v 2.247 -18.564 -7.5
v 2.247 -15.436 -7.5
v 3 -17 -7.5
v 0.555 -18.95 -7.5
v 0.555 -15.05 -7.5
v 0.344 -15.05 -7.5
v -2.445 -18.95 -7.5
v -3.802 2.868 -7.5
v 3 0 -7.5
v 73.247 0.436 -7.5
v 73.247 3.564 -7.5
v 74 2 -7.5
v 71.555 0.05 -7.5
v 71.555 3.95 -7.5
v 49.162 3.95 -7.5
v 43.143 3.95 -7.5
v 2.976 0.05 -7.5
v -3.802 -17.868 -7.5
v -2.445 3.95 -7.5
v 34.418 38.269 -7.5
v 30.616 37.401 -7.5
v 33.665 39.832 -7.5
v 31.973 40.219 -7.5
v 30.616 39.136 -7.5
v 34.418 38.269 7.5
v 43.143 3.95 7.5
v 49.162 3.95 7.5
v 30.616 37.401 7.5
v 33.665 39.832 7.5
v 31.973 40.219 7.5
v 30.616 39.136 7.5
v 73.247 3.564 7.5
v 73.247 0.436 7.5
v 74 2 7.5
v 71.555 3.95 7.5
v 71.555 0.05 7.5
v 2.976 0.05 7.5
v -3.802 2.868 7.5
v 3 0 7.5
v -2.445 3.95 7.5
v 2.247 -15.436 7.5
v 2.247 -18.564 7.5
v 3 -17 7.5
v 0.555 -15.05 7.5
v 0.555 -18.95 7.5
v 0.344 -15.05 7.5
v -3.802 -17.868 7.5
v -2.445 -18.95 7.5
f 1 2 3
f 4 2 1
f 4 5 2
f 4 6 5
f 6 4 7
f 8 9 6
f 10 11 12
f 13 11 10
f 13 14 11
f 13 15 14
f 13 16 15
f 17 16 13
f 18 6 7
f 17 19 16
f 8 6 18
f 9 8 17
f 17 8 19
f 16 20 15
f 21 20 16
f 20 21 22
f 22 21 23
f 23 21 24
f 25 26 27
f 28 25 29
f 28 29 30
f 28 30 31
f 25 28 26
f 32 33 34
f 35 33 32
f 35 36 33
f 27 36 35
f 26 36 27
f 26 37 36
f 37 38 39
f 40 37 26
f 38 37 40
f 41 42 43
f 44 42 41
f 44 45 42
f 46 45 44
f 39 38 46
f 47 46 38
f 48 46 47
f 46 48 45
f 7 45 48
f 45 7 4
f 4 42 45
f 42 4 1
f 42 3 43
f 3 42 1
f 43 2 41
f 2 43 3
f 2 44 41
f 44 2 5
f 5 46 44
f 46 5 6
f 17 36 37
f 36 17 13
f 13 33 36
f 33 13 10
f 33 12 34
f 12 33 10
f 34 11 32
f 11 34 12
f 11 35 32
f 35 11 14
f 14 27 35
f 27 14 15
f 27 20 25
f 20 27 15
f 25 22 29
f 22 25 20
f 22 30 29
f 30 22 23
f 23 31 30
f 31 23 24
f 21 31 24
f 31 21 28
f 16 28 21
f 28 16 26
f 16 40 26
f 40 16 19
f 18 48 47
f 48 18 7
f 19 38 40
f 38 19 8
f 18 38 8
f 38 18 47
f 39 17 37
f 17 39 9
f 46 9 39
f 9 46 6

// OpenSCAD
// file: stand.scad
//CUSTOMIZER VARIABLES

// The width of the stand when looking from the front
stand_width = 50;

// The depth of the spot in which the stood object sits
bottom_depth = 50;

// The height of the stand measured up the backrest
backrest_height = 150;

// The angle that the stood object leans back
lean_angle = 20;

// The distance between the points of contact when the stand is leaned back
base_distance = 100;

// The height at which the stand part intersects with the backrest
join_height = 100;

// The height of the lip
lip_height = 10;

// The thickness of all parts of the stand
structure_thickness = 15;

//CUSTOMIZER VARIABLES END

module stand(width=stand_width, depth=bottom_depth, height=backrest_height, angle=lean_angle, base=base_distance, join=join_height, lip=lip_height, thickness=structure_thickness) {
    linear_extrude(height = width, center = true)
    union() {
        // Backrest
        hull() {
            translate([height-(thickness/2),(thickness/2),0]) circle(d=thickness);
            translate([-(thickness/2),(thickness/2),0]) circle(d=thickness);
        }
        // Stand
        hull() {
            translate([join-(thickness/2),(thickness/2),0]) circle(d=thickness);
            translate([max(join-thickness, -thickness/2),(thickness/2),0]) circle(d=thickness);
            translate([sin(angle) * base - (thickness/2),cos(angle) * base + (thickness/2),0]) circle(d=thickness);
        }
        // Holder
        hull() {
            translate([-(thickness/2),-depth-(thickness/2),0]) circle(d=thickness);
            translate([-(thickness/2),(thickness/2),0])circle(d=thickness);
        }
        // Lip
        hull() {
            translate([-(thickness/2),-depth-(thickness/2),0]) circle(d=thickness);
            translate([lip -(thickness/2),-depth-(thickness/2),0]) circle(d=thickness);
        }
    }
}

stand();
// main file
use <stand.scad>

// Stand when combined with the 3DS charging cradle so the console is propped at the same angle as stand-ndslite.scad

union() {
    stand(
        width=15,
        depth=15,
        height=74,
        angle=35 + 8.5,
        base=50,
        join=50,
        lip=3,
        thickness=4
    );
    linear_extrude(height = 15, center = true)
    hull() {
        translate([-2,-15-2,0]) circle(d=4);
        translate([-2,2,0])circle(d=4);        
        translate([1,0,0])circle(d=4);        
    }
}
